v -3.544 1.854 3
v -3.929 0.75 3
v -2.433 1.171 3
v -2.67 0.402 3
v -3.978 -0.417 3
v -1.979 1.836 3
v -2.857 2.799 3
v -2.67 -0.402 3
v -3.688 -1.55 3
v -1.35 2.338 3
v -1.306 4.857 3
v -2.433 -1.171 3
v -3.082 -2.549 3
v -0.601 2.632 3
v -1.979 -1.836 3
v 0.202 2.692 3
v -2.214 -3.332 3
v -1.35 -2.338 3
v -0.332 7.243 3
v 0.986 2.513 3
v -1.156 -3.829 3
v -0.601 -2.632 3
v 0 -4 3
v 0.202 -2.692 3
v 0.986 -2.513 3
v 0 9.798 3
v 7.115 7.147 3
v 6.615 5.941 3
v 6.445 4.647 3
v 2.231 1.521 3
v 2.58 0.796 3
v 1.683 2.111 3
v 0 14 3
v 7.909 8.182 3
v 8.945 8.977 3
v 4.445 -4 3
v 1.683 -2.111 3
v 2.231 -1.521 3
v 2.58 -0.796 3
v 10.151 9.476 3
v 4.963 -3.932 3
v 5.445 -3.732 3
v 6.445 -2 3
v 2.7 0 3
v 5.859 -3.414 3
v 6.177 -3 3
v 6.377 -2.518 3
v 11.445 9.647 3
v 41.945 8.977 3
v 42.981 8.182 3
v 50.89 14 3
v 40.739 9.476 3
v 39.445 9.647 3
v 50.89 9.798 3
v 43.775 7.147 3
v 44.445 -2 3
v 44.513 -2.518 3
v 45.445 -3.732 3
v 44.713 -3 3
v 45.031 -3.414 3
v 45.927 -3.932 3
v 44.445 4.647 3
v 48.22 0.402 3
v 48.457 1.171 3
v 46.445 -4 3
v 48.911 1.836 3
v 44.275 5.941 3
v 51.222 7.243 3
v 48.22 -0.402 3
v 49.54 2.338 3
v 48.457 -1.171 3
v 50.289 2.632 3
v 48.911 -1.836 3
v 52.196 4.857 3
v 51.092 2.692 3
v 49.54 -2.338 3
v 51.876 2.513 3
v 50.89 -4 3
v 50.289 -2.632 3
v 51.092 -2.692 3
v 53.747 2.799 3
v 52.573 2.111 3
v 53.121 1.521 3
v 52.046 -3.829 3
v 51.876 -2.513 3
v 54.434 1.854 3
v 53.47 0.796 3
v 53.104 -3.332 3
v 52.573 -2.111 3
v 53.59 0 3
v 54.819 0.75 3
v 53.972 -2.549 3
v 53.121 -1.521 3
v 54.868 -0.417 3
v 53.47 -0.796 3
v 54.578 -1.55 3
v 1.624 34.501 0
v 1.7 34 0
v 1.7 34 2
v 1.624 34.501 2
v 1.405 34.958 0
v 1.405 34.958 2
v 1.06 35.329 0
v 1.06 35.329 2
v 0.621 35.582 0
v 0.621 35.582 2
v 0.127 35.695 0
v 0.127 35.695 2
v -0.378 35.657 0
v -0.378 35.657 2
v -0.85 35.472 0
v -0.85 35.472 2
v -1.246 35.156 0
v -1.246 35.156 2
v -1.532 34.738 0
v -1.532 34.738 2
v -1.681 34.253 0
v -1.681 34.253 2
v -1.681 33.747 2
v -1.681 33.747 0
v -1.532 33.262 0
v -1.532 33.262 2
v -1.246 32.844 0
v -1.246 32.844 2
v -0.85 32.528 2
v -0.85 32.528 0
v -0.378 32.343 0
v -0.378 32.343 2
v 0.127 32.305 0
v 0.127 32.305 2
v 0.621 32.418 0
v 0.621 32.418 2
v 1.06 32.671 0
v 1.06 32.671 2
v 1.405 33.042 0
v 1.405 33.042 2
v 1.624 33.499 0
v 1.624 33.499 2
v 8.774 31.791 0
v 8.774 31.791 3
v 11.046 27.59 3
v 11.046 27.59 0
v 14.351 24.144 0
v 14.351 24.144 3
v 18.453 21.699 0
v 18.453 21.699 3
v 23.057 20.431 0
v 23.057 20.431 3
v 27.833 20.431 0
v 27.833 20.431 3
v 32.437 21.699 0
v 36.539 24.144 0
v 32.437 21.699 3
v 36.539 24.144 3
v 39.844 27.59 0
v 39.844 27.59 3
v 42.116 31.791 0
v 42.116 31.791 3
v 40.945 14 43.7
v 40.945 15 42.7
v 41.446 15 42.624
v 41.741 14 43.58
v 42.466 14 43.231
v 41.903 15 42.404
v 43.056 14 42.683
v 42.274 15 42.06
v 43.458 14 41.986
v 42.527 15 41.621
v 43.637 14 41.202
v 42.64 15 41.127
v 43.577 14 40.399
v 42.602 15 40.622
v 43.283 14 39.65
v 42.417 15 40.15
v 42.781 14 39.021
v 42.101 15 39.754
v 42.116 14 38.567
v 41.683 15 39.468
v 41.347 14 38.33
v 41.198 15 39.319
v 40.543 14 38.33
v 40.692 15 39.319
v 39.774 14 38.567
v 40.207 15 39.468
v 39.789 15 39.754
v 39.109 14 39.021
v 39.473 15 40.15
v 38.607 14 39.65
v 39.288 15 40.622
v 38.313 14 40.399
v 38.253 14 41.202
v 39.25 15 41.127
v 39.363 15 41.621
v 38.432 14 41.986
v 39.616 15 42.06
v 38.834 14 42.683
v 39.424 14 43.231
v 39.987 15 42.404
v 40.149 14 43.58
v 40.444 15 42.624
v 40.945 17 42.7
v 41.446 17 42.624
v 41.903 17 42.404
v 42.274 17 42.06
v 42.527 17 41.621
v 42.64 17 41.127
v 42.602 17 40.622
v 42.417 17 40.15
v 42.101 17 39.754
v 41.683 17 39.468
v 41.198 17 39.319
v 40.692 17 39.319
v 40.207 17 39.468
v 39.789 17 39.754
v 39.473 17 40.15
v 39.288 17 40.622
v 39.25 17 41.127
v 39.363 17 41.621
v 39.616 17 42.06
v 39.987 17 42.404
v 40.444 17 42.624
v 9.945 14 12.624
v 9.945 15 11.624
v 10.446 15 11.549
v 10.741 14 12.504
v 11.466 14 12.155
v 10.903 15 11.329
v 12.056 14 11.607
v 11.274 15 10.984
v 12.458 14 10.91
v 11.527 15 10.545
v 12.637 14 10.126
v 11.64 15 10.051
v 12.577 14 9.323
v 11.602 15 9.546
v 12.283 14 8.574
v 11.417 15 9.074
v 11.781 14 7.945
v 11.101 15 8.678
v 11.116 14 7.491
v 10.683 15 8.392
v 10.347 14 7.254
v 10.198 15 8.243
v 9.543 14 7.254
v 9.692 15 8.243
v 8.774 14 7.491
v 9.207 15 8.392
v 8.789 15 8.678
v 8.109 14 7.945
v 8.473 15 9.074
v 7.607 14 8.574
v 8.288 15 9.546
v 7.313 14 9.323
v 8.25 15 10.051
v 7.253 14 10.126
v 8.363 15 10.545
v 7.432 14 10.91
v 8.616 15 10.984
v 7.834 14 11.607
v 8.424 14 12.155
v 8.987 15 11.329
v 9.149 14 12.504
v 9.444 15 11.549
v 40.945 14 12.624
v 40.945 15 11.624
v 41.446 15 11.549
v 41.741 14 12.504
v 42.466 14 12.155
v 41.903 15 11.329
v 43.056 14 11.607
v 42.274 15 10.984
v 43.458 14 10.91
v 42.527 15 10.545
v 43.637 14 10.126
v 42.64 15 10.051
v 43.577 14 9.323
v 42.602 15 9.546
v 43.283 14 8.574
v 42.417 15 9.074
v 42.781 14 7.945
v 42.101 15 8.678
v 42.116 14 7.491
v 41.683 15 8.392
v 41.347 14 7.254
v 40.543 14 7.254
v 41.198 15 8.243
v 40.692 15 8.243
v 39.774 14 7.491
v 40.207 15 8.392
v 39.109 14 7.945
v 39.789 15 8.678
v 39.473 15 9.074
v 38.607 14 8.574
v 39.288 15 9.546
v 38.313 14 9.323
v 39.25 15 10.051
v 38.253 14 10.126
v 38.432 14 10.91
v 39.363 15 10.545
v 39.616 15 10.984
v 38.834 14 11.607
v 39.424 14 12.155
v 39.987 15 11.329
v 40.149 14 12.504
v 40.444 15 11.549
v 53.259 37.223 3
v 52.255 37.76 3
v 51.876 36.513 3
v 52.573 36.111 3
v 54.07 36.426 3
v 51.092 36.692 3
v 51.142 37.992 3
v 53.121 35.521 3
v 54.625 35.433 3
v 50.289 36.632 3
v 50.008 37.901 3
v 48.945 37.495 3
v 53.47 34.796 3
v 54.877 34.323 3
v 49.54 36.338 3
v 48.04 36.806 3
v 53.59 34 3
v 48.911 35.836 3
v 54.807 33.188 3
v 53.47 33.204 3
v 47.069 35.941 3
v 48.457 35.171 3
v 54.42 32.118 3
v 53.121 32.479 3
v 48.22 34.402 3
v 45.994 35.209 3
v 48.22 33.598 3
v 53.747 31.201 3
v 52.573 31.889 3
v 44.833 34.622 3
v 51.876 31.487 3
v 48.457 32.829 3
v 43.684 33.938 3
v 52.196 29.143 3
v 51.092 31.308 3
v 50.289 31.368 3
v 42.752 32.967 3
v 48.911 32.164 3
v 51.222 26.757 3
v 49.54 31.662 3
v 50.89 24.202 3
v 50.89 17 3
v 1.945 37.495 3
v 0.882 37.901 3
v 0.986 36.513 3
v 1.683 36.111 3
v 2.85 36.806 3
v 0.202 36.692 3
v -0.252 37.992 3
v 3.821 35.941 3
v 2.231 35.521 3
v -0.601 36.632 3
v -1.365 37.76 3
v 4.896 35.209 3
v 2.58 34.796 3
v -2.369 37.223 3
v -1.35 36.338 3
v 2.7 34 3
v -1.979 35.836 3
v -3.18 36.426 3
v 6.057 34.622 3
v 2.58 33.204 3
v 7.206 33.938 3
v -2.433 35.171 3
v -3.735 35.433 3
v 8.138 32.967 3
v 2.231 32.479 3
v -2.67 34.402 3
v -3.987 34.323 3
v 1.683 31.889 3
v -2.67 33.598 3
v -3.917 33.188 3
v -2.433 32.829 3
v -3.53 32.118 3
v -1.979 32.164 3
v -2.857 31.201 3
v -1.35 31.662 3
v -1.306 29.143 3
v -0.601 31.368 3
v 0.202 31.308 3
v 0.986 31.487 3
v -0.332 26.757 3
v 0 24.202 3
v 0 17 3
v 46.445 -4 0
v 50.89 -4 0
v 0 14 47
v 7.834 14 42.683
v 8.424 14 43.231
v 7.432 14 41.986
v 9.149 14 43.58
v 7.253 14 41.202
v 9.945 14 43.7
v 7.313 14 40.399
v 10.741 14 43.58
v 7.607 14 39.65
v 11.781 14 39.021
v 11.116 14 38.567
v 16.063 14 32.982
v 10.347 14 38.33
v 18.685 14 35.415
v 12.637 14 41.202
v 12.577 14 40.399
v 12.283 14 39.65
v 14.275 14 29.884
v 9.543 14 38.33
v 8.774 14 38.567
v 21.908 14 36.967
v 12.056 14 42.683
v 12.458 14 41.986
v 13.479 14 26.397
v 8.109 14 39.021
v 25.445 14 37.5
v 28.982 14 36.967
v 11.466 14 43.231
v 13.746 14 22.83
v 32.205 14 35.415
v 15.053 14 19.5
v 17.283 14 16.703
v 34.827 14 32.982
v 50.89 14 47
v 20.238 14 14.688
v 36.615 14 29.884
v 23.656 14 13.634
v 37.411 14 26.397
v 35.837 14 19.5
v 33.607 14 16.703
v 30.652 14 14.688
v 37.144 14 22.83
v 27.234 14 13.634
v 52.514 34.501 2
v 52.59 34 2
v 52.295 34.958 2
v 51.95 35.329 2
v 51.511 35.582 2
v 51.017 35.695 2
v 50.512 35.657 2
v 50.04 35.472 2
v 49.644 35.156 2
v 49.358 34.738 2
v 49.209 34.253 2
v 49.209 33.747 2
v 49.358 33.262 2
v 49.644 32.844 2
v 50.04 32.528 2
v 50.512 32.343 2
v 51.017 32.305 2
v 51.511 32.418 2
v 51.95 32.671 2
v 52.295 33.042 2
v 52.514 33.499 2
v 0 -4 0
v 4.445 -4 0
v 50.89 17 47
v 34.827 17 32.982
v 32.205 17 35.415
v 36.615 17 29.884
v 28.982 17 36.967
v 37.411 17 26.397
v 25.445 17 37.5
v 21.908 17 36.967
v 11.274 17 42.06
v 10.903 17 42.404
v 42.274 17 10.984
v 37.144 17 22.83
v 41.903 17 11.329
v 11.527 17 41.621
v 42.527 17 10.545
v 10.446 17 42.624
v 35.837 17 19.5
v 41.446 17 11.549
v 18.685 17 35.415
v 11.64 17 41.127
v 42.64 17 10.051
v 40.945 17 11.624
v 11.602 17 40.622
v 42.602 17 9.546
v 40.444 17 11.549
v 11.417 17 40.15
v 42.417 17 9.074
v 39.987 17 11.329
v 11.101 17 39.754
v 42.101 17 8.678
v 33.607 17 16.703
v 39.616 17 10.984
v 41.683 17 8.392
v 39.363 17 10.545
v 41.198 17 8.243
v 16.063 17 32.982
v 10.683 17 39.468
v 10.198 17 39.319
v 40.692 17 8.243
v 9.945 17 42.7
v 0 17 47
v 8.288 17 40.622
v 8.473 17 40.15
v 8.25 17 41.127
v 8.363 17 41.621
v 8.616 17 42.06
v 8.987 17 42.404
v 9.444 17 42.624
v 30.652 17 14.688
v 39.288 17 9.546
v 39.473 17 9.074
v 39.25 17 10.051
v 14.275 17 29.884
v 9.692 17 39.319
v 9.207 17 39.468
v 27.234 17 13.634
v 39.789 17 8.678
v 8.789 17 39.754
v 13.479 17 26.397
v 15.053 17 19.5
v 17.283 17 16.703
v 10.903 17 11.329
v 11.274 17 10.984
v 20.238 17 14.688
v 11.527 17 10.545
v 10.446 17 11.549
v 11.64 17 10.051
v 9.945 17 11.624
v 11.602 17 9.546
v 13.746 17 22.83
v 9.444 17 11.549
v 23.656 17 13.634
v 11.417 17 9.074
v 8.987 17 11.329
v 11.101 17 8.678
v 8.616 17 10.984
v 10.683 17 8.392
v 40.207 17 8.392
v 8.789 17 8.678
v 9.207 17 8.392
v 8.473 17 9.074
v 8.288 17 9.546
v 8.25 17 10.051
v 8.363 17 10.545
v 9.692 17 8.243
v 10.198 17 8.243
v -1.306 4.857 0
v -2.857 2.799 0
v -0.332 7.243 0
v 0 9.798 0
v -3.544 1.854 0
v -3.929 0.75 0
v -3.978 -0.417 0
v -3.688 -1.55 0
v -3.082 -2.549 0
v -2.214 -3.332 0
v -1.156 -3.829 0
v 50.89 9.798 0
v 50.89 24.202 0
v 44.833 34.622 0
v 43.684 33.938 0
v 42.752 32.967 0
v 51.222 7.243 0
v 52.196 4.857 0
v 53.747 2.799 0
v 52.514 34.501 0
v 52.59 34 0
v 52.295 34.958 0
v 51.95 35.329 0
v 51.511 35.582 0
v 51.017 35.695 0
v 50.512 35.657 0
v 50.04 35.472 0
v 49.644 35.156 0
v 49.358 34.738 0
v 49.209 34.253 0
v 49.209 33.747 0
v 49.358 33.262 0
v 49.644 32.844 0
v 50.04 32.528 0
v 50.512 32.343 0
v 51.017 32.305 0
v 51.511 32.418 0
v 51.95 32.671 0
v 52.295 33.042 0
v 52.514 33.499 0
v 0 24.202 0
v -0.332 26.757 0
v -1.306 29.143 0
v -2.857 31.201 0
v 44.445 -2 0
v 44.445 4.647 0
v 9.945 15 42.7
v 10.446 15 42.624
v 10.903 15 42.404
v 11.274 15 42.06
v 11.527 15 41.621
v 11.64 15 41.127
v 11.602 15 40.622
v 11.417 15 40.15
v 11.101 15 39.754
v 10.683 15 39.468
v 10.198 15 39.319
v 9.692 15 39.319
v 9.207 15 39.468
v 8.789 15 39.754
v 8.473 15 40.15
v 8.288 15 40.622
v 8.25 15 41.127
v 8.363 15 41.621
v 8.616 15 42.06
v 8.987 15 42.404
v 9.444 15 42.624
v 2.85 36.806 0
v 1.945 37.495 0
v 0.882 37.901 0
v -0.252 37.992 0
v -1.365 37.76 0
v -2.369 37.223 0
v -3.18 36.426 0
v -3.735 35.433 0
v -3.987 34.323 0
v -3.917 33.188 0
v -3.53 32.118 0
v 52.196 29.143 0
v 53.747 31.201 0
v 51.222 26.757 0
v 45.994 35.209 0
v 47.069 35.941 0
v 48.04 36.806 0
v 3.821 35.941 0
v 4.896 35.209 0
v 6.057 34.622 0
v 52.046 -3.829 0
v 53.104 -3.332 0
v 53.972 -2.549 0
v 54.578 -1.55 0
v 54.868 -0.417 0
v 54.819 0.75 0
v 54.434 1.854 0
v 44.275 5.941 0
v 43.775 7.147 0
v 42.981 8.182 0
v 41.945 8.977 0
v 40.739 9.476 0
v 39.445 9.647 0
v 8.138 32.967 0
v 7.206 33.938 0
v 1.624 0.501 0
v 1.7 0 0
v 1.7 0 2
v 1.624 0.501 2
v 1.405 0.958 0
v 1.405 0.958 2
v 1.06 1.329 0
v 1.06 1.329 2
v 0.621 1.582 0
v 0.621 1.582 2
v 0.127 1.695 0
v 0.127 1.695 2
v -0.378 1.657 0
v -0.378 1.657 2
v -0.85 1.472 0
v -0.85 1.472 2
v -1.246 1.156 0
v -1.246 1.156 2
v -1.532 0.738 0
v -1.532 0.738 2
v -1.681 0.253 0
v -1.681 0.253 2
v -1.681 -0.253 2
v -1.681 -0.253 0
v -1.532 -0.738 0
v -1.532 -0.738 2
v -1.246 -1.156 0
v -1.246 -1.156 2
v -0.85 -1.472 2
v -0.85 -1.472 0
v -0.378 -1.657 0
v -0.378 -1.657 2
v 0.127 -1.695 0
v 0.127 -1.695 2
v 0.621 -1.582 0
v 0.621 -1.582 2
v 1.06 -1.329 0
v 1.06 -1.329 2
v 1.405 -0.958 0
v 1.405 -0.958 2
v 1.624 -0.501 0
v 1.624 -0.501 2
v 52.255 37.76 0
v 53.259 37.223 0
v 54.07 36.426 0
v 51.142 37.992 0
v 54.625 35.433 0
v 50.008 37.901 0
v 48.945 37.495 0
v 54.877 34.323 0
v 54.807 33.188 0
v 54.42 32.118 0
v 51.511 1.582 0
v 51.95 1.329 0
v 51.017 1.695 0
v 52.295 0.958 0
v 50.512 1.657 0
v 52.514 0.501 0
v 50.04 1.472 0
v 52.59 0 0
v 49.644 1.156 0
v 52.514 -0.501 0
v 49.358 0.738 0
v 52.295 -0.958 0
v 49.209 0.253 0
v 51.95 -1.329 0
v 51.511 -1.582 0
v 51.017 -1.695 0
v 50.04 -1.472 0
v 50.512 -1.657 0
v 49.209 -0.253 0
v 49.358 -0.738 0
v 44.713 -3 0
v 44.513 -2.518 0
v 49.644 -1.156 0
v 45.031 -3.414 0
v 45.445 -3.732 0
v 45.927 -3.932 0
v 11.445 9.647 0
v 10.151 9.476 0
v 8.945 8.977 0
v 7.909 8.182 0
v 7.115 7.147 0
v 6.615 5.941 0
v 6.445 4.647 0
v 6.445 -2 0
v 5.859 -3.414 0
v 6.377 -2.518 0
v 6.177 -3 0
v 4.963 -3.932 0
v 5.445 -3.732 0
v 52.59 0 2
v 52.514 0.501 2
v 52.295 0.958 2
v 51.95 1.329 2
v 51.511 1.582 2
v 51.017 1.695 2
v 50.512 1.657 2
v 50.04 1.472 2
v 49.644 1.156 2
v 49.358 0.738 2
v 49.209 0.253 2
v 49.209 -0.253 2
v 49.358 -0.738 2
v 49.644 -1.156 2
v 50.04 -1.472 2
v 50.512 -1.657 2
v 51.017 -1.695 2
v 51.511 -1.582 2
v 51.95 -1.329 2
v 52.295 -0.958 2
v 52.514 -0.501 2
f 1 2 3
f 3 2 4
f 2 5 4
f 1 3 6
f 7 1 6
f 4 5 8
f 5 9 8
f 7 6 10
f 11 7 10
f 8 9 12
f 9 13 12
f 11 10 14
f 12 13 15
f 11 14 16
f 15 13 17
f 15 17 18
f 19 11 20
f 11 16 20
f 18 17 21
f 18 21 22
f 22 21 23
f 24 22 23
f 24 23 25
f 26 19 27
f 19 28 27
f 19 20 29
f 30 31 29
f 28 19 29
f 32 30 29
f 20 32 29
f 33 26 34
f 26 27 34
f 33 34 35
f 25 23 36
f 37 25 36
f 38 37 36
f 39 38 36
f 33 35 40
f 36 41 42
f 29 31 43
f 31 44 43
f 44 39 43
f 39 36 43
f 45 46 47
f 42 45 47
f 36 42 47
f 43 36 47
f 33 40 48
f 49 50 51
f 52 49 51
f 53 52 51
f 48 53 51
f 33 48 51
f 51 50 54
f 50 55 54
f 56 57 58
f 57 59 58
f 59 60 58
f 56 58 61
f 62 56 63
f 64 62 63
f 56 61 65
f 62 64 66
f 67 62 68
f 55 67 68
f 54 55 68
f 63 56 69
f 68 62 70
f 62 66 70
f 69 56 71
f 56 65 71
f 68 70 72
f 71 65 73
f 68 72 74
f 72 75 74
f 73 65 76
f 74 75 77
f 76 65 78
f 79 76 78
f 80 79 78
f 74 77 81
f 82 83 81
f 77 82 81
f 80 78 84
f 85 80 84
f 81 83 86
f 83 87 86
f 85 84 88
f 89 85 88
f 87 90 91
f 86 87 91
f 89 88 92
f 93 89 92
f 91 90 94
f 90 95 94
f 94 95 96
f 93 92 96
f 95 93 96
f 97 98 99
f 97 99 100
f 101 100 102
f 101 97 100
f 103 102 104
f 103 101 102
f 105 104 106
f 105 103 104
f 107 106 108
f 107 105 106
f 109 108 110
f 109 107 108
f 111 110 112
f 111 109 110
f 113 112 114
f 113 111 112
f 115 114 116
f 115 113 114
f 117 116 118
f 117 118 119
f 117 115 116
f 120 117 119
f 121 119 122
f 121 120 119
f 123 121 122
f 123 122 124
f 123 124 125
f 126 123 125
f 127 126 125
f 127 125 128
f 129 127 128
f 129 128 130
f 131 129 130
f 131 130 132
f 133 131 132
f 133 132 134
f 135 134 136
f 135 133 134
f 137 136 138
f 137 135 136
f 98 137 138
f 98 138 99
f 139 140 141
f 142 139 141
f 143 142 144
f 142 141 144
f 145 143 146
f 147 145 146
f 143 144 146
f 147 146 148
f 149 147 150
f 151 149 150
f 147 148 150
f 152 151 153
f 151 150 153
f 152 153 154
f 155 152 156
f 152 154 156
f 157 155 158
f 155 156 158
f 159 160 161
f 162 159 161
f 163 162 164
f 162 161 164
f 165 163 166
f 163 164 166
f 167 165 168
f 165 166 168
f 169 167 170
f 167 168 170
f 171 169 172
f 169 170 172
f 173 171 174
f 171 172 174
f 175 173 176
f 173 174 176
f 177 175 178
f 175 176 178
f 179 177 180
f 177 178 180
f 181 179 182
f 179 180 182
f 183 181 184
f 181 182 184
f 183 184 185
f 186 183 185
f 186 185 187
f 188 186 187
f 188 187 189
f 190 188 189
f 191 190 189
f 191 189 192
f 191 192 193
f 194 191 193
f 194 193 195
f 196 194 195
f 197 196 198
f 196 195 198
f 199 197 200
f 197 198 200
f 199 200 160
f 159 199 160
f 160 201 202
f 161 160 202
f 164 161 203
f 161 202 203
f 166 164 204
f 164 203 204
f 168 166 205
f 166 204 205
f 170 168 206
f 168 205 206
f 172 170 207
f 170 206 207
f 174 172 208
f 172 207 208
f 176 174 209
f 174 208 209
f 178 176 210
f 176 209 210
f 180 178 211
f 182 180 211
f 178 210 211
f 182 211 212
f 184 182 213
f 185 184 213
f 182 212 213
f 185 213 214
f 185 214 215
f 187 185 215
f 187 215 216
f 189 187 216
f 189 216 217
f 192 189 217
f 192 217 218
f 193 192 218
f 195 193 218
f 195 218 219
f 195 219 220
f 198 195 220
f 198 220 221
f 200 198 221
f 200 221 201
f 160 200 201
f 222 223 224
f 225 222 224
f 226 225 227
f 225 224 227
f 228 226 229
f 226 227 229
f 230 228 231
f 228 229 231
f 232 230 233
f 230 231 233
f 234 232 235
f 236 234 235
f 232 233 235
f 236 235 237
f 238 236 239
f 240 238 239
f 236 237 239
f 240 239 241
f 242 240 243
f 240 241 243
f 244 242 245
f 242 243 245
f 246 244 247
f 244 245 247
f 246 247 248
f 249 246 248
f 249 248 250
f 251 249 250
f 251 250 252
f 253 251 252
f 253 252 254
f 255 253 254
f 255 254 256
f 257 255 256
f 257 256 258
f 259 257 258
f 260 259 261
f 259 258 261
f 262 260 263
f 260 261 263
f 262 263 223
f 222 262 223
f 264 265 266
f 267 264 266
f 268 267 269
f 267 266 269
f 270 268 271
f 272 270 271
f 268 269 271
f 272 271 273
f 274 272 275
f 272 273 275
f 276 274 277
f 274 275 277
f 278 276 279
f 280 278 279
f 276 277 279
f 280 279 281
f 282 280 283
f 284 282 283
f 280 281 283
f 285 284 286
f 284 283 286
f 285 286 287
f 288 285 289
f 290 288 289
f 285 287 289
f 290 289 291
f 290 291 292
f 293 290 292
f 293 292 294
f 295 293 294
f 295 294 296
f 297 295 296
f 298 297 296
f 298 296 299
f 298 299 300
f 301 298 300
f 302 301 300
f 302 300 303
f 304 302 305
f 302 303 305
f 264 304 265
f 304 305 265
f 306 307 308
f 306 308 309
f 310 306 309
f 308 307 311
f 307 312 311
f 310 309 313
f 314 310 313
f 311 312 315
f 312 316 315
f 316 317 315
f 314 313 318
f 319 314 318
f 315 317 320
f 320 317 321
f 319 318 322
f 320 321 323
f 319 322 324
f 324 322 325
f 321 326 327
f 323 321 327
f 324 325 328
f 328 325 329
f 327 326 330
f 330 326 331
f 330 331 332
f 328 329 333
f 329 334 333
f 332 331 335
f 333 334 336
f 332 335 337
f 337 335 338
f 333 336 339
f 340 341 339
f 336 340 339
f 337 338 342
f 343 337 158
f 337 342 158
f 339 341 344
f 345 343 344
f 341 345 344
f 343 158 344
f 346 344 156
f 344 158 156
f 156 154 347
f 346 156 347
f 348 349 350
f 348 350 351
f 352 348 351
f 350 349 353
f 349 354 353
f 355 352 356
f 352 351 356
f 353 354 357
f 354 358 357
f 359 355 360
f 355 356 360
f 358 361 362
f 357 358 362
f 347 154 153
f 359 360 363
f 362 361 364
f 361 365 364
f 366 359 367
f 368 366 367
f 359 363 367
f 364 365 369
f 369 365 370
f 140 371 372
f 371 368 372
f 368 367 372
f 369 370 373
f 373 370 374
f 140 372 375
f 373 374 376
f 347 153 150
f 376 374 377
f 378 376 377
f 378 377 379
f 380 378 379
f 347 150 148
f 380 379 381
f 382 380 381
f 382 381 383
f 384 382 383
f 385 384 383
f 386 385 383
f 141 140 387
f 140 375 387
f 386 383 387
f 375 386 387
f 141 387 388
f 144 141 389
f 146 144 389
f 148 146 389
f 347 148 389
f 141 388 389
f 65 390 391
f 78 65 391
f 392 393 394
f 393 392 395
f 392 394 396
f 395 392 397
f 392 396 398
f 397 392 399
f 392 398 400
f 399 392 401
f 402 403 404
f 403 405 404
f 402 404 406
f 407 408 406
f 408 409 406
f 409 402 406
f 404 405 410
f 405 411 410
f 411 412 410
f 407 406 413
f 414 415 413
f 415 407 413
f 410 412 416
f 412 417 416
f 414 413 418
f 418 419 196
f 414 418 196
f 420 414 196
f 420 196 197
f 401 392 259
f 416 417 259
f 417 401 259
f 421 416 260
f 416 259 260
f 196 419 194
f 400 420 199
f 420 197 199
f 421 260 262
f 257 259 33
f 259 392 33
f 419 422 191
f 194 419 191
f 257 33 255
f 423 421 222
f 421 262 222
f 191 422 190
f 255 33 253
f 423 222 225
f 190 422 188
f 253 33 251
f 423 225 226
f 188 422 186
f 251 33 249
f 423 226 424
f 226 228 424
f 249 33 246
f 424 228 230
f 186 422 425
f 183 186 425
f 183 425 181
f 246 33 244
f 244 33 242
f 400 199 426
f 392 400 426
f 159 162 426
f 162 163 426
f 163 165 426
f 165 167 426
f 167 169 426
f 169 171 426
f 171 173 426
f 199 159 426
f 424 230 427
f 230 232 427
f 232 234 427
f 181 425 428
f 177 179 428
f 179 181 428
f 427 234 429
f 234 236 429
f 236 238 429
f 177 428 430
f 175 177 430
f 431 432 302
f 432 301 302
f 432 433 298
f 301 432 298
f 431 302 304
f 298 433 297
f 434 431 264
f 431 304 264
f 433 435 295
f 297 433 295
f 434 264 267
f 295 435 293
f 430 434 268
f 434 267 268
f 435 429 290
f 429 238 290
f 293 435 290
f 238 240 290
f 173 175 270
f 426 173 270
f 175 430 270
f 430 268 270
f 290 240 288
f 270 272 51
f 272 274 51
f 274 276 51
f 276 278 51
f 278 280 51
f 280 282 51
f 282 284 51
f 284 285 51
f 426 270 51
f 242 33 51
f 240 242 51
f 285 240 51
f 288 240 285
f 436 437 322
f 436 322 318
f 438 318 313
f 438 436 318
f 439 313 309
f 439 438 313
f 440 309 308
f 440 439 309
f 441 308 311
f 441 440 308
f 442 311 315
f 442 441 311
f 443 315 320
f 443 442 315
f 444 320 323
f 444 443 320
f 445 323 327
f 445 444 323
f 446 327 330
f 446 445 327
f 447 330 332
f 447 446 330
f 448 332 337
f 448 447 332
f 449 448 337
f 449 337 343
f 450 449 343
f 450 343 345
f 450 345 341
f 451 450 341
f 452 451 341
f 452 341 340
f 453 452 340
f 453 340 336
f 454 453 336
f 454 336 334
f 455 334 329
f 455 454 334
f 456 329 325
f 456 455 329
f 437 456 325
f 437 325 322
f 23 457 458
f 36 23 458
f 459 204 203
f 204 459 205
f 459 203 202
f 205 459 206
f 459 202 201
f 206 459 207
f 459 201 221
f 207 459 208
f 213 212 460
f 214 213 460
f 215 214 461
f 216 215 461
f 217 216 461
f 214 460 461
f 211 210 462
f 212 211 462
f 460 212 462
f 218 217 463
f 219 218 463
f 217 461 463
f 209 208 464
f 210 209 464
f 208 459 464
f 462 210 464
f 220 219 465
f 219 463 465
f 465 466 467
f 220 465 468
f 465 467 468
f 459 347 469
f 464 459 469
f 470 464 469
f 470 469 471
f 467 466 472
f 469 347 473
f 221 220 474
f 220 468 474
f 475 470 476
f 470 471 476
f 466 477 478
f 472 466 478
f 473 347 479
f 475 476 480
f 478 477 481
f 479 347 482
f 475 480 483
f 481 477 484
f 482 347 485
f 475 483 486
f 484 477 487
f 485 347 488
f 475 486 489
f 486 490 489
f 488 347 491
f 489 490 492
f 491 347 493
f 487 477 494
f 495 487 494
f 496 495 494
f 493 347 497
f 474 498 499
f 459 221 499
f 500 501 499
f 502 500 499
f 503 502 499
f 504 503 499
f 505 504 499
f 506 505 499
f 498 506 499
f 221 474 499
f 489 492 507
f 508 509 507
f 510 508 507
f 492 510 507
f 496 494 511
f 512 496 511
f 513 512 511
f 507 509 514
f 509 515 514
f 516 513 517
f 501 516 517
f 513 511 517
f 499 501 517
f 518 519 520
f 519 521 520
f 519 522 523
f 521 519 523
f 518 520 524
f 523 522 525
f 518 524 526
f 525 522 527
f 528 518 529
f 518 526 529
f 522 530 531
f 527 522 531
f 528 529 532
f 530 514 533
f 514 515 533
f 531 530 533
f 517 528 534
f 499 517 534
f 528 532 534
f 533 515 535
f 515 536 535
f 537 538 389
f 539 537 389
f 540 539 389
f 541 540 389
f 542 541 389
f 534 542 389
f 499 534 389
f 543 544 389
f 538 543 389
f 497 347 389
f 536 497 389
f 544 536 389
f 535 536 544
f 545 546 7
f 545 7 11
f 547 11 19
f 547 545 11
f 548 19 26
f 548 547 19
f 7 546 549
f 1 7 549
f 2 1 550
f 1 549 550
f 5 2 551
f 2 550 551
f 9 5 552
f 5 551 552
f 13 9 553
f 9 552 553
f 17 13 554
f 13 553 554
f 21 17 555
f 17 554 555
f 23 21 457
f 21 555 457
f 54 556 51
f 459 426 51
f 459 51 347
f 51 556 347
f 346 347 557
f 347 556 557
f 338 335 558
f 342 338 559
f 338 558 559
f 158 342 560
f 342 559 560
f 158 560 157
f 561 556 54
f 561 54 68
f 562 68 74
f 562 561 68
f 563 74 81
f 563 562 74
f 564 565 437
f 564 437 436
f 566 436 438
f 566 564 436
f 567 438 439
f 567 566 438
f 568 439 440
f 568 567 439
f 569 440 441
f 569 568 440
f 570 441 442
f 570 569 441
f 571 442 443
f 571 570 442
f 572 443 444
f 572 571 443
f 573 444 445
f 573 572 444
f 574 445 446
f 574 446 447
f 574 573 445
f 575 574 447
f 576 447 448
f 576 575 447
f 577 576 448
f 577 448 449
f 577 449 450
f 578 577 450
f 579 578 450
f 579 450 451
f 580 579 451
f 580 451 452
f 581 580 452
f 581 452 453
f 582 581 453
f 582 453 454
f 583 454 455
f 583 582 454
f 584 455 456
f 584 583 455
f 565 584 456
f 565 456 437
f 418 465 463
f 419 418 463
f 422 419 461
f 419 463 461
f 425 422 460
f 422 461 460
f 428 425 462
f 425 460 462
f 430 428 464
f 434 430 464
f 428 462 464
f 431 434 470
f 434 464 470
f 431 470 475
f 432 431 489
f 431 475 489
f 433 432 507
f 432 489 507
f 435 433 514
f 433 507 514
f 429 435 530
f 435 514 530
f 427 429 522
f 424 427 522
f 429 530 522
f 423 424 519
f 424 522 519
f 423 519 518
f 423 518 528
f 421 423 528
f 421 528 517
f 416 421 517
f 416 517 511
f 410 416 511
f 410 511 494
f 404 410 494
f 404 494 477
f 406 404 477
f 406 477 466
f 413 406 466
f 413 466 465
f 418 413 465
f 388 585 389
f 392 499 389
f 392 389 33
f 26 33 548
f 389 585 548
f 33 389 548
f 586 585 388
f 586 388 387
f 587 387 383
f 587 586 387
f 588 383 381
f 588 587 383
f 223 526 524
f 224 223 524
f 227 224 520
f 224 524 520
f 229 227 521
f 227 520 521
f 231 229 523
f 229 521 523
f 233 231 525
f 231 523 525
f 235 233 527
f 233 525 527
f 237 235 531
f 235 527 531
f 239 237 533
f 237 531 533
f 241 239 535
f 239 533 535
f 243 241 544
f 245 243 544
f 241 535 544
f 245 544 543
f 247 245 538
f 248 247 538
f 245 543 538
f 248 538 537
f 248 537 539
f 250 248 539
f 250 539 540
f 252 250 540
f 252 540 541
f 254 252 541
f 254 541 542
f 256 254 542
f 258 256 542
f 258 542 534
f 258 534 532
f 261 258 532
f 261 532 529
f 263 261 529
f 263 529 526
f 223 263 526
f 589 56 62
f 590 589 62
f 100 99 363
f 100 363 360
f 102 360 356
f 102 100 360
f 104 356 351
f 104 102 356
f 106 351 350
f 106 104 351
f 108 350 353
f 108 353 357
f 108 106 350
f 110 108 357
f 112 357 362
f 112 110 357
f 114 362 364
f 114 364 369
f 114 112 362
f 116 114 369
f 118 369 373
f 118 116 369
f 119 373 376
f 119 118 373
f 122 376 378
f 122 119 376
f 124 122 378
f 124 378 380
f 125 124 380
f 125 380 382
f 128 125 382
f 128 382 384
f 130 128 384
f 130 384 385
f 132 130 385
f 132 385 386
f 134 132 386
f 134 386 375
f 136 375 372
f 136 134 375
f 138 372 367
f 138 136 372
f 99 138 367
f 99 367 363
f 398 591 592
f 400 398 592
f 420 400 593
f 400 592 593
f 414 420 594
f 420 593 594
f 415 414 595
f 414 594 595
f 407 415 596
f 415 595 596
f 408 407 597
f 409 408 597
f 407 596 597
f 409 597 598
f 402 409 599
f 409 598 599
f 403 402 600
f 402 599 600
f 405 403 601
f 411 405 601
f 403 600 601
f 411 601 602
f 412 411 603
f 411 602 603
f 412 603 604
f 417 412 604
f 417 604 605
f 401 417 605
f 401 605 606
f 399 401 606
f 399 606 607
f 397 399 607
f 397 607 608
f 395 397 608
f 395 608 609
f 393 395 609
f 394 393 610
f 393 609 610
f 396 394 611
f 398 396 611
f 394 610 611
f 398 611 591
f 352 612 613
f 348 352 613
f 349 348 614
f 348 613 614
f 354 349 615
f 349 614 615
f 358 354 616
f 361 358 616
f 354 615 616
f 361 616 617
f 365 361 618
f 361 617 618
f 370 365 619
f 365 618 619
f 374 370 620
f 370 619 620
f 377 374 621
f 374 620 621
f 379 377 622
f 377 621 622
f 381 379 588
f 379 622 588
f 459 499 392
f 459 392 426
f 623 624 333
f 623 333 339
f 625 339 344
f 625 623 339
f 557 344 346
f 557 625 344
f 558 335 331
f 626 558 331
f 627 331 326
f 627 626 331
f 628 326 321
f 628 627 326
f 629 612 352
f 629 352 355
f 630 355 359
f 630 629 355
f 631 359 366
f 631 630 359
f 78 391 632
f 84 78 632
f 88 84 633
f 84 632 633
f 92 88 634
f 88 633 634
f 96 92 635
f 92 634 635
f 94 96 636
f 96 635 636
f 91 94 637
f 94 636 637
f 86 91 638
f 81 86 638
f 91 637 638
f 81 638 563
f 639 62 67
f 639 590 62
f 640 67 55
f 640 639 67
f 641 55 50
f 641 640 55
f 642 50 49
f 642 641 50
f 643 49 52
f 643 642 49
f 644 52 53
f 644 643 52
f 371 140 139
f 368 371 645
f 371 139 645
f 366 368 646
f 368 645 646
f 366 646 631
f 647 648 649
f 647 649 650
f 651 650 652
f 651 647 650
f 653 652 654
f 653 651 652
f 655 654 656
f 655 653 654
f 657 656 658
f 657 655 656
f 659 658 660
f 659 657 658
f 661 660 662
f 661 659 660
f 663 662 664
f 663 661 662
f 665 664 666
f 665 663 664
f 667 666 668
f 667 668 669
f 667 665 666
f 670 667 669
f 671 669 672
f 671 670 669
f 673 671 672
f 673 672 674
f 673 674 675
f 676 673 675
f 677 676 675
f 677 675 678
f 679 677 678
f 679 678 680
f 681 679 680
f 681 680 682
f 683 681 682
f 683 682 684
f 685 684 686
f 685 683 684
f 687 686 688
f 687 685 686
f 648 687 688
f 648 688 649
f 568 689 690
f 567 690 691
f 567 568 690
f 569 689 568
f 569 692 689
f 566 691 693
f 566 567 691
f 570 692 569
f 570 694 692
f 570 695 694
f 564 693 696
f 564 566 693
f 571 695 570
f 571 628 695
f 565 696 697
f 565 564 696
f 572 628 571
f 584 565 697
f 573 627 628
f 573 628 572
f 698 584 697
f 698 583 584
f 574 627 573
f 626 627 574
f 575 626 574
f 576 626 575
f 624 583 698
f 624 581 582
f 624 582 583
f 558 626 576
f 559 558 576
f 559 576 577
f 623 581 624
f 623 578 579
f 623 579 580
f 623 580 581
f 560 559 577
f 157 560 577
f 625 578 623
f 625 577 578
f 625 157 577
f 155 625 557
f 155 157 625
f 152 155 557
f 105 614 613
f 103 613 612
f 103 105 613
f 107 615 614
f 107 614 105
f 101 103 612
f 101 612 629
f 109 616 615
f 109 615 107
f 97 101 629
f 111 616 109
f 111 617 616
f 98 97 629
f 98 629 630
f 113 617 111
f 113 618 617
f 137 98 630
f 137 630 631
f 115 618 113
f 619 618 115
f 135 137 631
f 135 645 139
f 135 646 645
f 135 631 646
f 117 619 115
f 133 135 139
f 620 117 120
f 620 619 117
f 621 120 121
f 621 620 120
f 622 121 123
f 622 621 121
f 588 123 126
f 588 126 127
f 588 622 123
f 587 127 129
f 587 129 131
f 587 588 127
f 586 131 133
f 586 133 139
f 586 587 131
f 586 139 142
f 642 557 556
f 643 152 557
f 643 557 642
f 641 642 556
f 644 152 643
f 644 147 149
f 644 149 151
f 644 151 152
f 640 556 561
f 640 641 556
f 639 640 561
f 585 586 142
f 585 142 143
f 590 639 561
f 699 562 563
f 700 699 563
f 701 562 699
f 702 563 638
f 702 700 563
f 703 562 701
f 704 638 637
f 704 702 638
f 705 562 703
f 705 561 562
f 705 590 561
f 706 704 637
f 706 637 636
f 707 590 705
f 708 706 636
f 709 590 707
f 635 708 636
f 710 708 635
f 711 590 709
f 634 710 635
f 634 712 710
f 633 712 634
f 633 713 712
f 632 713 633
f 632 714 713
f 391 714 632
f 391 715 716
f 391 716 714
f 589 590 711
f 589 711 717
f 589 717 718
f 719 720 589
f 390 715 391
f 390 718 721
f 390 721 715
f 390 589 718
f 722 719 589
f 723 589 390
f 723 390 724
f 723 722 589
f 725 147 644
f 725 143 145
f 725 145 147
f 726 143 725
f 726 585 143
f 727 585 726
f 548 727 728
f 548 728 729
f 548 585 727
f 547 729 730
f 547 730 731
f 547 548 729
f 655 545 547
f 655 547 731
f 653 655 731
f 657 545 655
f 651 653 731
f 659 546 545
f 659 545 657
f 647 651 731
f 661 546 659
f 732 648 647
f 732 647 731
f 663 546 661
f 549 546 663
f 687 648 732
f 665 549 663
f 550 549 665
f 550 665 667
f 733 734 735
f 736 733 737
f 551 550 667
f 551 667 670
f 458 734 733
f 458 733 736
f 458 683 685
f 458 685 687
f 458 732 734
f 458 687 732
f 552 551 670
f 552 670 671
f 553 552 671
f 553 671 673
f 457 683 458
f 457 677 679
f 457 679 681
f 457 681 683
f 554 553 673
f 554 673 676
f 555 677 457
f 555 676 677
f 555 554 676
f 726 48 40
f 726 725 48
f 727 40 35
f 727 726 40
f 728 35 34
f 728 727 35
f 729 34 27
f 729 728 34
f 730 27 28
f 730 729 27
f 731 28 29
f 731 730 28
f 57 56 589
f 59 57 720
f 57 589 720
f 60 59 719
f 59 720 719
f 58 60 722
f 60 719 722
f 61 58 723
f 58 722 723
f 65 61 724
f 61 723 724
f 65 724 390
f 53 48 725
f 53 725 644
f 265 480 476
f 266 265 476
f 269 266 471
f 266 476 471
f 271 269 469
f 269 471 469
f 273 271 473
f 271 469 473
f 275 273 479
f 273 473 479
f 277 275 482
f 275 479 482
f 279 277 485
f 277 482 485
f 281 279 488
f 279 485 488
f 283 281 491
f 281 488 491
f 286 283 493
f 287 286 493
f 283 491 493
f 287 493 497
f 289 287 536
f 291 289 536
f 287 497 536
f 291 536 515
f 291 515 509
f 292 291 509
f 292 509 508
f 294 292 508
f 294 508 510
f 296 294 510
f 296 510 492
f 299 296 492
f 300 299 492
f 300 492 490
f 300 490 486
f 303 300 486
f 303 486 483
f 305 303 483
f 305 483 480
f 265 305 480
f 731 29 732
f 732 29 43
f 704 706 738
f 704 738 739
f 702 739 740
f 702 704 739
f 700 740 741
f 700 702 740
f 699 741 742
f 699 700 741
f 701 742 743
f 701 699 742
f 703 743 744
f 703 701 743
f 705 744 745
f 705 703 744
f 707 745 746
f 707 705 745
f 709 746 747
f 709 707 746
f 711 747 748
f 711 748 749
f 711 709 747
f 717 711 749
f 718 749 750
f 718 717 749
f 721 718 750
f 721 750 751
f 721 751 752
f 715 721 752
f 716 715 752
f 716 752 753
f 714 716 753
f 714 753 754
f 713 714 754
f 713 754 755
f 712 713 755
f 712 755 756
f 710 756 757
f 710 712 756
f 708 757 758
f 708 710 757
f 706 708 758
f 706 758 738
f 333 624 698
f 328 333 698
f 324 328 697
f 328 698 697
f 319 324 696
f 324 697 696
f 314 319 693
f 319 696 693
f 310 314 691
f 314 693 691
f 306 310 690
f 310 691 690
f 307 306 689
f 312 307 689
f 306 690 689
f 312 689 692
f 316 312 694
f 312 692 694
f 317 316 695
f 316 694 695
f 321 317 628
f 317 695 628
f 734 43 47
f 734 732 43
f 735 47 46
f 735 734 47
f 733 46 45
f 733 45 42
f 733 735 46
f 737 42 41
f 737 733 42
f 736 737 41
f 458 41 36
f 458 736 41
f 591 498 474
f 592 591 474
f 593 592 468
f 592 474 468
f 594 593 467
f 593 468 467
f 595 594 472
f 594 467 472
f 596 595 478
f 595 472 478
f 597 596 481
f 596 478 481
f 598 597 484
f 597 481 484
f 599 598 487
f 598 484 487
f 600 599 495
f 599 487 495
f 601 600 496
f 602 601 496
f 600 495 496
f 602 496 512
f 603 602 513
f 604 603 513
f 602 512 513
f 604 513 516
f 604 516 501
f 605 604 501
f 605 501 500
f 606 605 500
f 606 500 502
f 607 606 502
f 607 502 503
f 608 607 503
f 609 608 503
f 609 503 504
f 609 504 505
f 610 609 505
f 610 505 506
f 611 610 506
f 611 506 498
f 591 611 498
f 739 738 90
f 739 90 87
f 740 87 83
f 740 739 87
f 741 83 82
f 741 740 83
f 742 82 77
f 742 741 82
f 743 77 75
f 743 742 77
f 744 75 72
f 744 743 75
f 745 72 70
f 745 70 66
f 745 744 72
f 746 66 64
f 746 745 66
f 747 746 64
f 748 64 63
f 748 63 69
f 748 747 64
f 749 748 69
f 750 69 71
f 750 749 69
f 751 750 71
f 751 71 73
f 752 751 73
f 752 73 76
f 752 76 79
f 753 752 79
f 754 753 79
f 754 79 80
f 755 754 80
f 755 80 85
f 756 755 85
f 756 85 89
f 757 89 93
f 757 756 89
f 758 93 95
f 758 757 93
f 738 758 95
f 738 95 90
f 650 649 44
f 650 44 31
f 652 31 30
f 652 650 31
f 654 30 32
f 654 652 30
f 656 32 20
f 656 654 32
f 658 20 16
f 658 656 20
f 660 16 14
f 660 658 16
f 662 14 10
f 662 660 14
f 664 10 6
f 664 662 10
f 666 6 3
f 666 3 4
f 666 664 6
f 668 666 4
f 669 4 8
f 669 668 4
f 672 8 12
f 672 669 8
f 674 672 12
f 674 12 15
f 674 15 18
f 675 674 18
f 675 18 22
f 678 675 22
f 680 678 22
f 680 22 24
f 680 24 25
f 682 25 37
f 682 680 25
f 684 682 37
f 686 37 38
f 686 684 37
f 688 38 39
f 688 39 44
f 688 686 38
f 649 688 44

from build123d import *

# Parameters (mm, degrees)
SKETCH_1_R          = 1.7
EXTRUDE_1_DEPTH     = 3
EXTRUDE_2_DEPTH     = 44
SKETCH_3_R          = 1.7
SKETCH_3_R_2        = 12
CUT_EXTRUDE_1_DEPTH = 4
SKETCH_4_W          = 38
SKETCH_4_H          = 9.646779348
SKETCH_4_H_2        = 4
CUT_EXTRUDE_2_DEPTH = 4
FILLET_1_R          = 10
CHAMFER_1_SIZE      = 1
CHAMFER_2_SIZE      = 1
FILLET_4_R          = 5
FILLET_5_R          = 2
FILLET_6_R          = 5


with BuildPart() as part:
    # Эскиз1 → Бобышка-Вытянуть1 (new body)
    with BuildSketch(Plane.XY):
        with BuildLine():
            ThreePointArc((0, 4), (-4, 0), (0, -4))
            Line((0, -4), (50.89, -4))
            ThreePointArc((50.89, -4), (54.89, 0), (50.89, 4))
            Line((50.89, 4), (50.89, 30))
            ThreePointArc((50.89, 30), (53.718427125, 36.828427125), (46.89, 34))
            Line((46.89, 34), (4, 34))
            ThreePointArc((4, 34), (-2.828427125, 36.828427125), (0, 30))
            Line((0, 30), (0, 4))
        make_face()
        with Locations((50.89, 34)):
            Circle(SKETCH_1_R, mode=Mode.SUBTRACT)
        Circle(SKETCH_1_R, mode=Mode.SUBTRACT)
        with Locations((50.89, 0)):
            Circle(SKETCH_1_R, mode=Mode.SUBTRACT)
        with Locations((0, 34)):
            Circle(SKETCH_1_R, mode=Mode.SUBTRACT)
    extrude(amount=EXTRUDE_1_DEPTH)

    # Эскиз2 → Бобышка-Вытянуть2 (add)
    with BuildSketch(Plane.XY.offset(3)):
        Polygon((50.89, 17), (28.893119951, 17), (0, 17), (0, 14), (50.89, 14), align=None)
    extrude(amount=EXTRUDE_2_DEPTH)

    # Эскиз3 → Вырез-Вытянуть1 (cut)
    with BuildSketch(Plane(origin=(0, 17, 0), x_dir=(1, 0, 0), z_dir=(0, 1, 0))):
        with Locations(Location((9.945, -40.999892664, 0), (0, 0, 270))):
            Circle(SKETCH_3_R)
        with Locations(Location((25.445, -25.5, 0), (0, 0, 270))):
            Circle(SKETCH_3_R_2)
        with Locations(Location((9.945, -9.924036406, 0), (0, 0, 270))):
            Circle(SKETCH_3_R)
        with Locations(Location((40.945, -9.924036406, 0), (0, 0, 270))):
            Circle(SKETCH_3_R)
        with Locations(Location((40.945, -40.999892664, 0), (0, 0, 270))):
            Circle(SKETCH_3_R)
    extrude(amount=-CUT_EXTRUDE_1_DEPTH, mode=Mode.SUBTRACT)

    # Эскиз4 → Вырез-Вытянуть2 (cut)
    with BuildSketch(Plane.XY.offset(3)):
        with BuildLine():
            Line((25.445, 34), (10.58125454, 34))
            Line((10.58125454, 34), (8.098408954, 34))
            ThreePointArc((8.098408954, 34), (25.445, 20.270756407), (42.791591046, 34))
            Line((42.791591046, 34), (25.445, 34))
        make_face()
        with Locations((25.445, 4.823389674)):
            Rectangle(SKETCH_4_W, SKETCH_4_H)
        with Locations((25.445, -2)):
            Rectangle(SKETCH_4_W, SKETCH_4_H_2)
    extrude(amount=-CUT_EXTRUDE_2_DEPTH, mode=Mode.SUBTRACT)

    # Скругление1
    # the kernel refuses this fillet: 10 mm, written as the material it adds along each edge
    with BuildSketch(Plane(origin=(0, 30, 0), x_dir=(0, -1, 0), z_dir=(0, 0, 1)), Plane(origin=(50.89, 4, 0), x_dir=(0, 1, 0), z_dir=(0, 0, 1))) as fillet_1_piece_1:
        with BuildLine():
            CenterArc((5.797958971, -10), FILLET_1_R, 90, 44.415308597)
            Line((-1.200583151, -2.857142857), (-1.340553994, -2.714285714))
            ThreePointArc((-1.340553994, -2.714285714), (-0.496723332, -1.472091229), (-0.2, 0))
            Line((-0.2, 0), (0, 0.2))
            Line((0, 0.2), (5.797958971, 0.2))
            Line((5.797958971, 0.2), (5.797958971, 0))
        make_face()
    extrude(amount=3)
    with BuildSketch(Plane(origin=(0, 4, 0), x_dir=(-0.9219149126204018, -0.387392428795552, 0), z_dir=(0, 0, 1)), Plane(origin=(50.89, 30, 0), x_dir=(0.9219149126204016, 0.38739242879555247, 0), z_dir=(0, 0, 1))) as fillet_1_piece_2:
        with BuildLine():
            CenterArc((6.973063718, -9.219149126), FILLET_1_R, 112.792345701, 44.415308597)
            Line((-2.246085408, -5.345224838), (-2.43046839, -5.267746352))
            Line((-2.43046839, -5.267746352), (-0.184382983, 0.077478486))
            Line((-0.184382983, 0.077478486), (0.077478486, 0.184382983))
            ThreePointArc((0.077478486, 0.184382983), (1.549569715, -0.11234035), (3.021660945, 0.184382983))
            Line((3.021660945, 0.184382983), (3.09913943, 0))
        make_face()
    extrude(amount=3)
    with BuildSketch(Plane(origin=(46.89, 34, 0), x_dir=(0.3790827918383792, 0.9253627596418714, 0), z_dir=(0, 0, 1))) as fillet_1_piece_3:
        with BuildLine():
            CenterArc((6.823490253, 9.253627596), FILLET_1_R, 213.100635844, 34.622483912)
            Line((-1.553636308, 3.79251502), (-1.72117884, 3.683292769))
            ThreePointArc((-1.72117884, 3.683292769), (-0.961890706, 1.820440952), (-0.185072552, -0.075816558))
            Line((-0.185072552, -0.075816558), (0.075816558, -0.185072552))
            ThreePointArc((0.075816558, -0.185072552), (1.516331167, 0.098548961), (2.956845776, -0.185072552))
            Line((2.956845776, -0.185072552), (3.032662335, 0))
        make_face()
    extrude(amount=3)
    with BuildSketch(Plane(origin=(4, 34, 0), x_dir=(-0.3790827918383573, 0.9253627596418805, 0), z_dir=(0, 0, 1))) as fillet_1_piece_4:
        with BuildLine():
            CenterArc((6.823490253, -9.253627596), FILLET_1_R, 112.276880243, 34.622483912)
            Line((-1.553636308, -3.79251502), (-1.72117884, -3.683292769))
            ThreePointArc((-1.72117884, -3.683292769), (-0.961890706, -1.820440952), (-0.185072552, 0.075816558))
            Line((-0.185072552, 0.075816558), (0.075816558, 0.185072552))
            ThreePointArc((0.075816558, 0.185072552), (1.516331167, -0.098548961), (2.956845776, 0.185072552))
            Line((2.956845776, 0.185072552), (3.032662335, 0))
        make_face()
    extrude(amount=3)

    # Фаска1
    chamfer_1_edges = [part.edges().sort_by_distance(p)[0] for p in [
        (40.945, 14, 8.224036406),
        (40.945, 14, 39.299892664),
        (9.945, 14, 39.299892664),
        (9.945, 14, 8.224036406),
    ]]
    chamfer(chamfer_1_edges, length=CHAMFER_1_SIZE)

    # Фаска2
    chamfer_2_edges = [part.edges().sort_by_distance(p)[0] for p in [
        (49.19, 34, 3),
        (-1.7, 0, 3),
        (49.19, 0, 3),
        (-1.7, 34, 3),
    ]]
    chamfer(chamfer_2_edges, length=CHAMFER_2_SIZE)

    # Скругление4
    fillet_4_edges = [part.edges().sort_by_distance(p)[0] for p in [
        (6.445, 9.646779348, 1.5),
        (44.445, 9.646779348, 1.5),
    ]]
    fillet(fillet_4_edges, radius=FILLET_4_R)

    # Скругление5
    fillet_5_edges = [part.edges().sort_by_distance(p)[0] for p in [
        (6.445, -4, 1.5),
        (44.445, -4, 1.5),
    ]]
    fillet(fillet_5_edges, radius=FILLET_5_R)

    # Скругление6
    fillet_6_edges = [part.edges().sort_by_distance(p)[0] for p in [
        (8.098408954, 34, 1.5),
        (42.791591046, 34, 1.5),
    ]]
    fillet(fillet_6_edges, radius=FILLET_6_R)


solid = part.part
